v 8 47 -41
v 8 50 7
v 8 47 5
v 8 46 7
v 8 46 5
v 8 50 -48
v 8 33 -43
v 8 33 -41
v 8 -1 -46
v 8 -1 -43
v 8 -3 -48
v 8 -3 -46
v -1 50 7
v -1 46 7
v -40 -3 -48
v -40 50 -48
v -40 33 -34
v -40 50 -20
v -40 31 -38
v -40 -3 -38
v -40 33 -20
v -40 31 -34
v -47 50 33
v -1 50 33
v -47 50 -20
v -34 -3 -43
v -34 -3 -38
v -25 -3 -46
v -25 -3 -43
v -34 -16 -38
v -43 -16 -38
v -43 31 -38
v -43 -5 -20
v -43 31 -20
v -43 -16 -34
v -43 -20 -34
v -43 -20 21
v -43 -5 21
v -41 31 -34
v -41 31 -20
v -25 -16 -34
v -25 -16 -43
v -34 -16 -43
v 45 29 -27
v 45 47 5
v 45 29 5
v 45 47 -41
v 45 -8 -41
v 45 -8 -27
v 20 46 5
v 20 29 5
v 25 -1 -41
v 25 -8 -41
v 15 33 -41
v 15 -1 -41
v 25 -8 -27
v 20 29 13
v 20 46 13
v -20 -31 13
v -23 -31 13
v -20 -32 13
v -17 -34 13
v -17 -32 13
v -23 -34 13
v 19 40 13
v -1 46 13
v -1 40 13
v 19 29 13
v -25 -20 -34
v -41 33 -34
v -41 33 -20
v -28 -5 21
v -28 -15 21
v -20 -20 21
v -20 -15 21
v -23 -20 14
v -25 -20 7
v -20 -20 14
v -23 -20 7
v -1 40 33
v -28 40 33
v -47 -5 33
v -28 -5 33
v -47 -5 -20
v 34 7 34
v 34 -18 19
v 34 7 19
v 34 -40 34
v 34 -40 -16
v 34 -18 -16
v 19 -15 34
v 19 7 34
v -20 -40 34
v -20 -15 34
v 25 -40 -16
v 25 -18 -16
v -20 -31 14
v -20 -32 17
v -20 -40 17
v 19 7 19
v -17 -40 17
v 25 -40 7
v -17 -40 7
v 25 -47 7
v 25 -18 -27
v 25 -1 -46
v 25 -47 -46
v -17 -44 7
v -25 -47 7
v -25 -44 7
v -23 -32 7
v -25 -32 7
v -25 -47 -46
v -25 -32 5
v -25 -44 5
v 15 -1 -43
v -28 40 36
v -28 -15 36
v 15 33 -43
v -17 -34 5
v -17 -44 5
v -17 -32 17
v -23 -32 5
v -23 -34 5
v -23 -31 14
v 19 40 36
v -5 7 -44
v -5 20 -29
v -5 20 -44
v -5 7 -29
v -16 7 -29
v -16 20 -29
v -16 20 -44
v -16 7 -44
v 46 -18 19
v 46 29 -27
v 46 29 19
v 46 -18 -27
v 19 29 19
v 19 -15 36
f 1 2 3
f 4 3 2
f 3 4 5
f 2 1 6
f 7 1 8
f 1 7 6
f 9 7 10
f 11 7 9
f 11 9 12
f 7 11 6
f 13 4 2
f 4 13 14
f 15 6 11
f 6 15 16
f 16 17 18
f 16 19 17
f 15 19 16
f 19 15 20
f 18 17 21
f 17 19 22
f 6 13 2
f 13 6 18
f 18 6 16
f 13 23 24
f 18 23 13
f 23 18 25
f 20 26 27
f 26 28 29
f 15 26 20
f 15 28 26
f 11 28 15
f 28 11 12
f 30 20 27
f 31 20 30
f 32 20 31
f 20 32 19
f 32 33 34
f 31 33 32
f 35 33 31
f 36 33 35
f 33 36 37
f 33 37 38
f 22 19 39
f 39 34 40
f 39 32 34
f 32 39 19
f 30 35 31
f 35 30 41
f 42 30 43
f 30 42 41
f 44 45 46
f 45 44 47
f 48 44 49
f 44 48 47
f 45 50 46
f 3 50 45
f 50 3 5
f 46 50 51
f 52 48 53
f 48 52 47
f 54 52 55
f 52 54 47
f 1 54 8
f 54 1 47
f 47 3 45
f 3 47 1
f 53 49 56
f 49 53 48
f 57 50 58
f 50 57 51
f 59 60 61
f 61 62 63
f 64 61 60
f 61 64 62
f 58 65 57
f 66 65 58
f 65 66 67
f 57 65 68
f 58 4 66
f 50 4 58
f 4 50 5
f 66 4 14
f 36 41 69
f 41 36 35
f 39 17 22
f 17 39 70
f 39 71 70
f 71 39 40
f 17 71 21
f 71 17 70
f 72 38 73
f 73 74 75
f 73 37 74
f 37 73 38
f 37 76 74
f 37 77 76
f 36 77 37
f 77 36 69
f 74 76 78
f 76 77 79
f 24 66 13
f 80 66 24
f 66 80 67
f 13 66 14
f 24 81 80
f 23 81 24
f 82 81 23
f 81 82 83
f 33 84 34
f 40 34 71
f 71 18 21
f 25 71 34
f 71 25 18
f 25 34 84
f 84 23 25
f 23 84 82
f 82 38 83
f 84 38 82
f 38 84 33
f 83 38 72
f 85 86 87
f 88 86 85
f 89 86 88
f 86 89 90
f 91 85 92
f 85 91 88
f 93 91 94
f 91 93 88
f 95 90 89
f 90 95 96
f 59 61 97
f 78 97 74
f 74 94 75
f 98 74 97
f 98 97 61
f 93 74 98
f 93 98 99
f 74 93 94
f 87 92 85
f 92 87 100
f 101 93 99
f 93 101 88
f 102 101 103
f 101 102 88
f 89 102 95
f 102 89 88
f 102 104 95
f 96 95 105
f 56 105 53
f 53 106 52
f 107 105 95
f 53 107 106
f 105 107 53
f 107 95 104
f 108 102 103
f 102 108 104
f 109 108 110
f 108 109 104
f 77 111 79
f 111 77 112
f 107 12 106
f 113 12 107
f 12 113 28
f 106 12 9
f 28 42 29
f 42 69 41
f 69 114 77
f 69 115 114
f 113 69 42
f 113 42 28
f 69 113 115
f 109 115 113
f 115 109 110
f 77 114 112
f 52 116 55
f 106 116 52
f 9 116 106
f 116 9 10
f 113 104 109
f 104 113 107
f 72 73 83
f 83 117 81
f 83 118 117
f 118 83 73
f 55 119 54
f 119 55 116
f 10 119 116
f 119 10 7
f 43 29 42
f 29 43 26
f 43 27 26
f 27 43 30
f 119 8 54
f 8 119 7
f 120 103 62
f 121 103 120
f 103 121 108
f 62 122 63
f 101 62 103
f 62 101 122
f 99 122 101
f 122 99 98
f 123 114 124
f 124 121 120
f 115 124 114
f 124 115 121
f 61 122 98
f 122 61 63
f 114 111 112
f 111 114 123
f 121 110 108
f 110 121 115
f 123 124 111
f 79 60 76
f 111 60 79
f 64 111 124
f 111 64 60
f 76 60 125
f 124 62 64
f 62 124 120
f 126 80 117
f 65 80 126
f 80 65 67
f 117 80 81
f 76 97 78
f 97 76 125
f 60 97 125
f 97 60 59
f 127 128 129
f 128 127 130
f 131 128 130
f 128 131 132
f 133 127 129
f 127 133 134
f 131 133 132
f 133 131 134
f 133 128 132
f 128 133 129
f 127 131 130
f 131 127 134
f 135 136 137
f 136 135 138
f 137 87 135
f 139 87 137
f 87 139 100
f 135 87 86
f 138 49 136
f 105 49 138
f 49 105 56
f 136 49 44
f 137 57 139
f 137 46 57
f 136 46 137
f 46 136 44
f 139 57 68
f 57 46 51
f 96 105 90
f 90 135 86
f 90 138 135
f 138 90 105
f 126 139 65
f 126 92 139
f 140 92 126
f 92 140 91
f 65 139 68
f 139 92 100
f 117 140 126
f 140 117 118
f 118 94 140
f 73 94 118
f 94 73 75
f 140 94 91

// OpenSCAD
union() {
difference() {
union() {
difference() {
union() {
difference() {
union() {
difference() {
union() {
difference() {
union() {
union() {
union() {
union() {
union() {
union() {
union() {
union() {
union() {
translate([-40, -3, -48]) {
cube([48, 53, 55], center=false);
};
translate([-38, -11, -30]) {
cube([49, 49, 50], center=false);
};
};
translate([-43, -16, -38]) {
cube([45, 47, 52], center=false);
};
};
translate([-10, -8, -41]) {
cube([55, 55, 46], center=false);
};
};
translate([-27, -2, -33]) {
cube([47, 48, 46], center=false);
};
};
translate([-41, -18, -34]) {
cube([46, 51, 54], center=false);
};
};
translate([-43, -20, -34]) {
cube([53, 48, 55], center=false);
};
};
translate([-47, -5, -20]) {
cube([46, 55, 53], center=false);
};
};
translate([-20, -40, -16]) {
cube([54, 47, 50], center=false);
};
};
translate([-25, -47, -46]) {
cube([50, 46, 53], center=false);
};
};
translate([-28, -6, 22]) {
cube([20, 11, 16], center=false);
};
};
translate([-34, -16, -43]) {
cube([49, 49, 47], center=false);
};
};
translate([-36, -44, 5]) {
cube([19, 12, 12], center=false);
};
};
translate([-23, -34, -38]) {
cube([46, 46, 51], center=false);
};
};
translate([-24, 26, -18]) {
cube([10, 14, 10], center=false);
};
};
translate([-23, -31, -38]) {
cube([46, 52, 52], center=false);
};
};
translate([-16, 7, -44]) {
cube([11, 13, 15], center=false);
};
};
translate([-8, -18, -27]) {
cube([54, 47, 46], center=false);
};
};
translate([-24, -3, 33]) {
cube([17, 11, 13], center=false);
};
};
translate([-28, -15, -18]) {
cube([47, 55, 54], center=false);
};
};
